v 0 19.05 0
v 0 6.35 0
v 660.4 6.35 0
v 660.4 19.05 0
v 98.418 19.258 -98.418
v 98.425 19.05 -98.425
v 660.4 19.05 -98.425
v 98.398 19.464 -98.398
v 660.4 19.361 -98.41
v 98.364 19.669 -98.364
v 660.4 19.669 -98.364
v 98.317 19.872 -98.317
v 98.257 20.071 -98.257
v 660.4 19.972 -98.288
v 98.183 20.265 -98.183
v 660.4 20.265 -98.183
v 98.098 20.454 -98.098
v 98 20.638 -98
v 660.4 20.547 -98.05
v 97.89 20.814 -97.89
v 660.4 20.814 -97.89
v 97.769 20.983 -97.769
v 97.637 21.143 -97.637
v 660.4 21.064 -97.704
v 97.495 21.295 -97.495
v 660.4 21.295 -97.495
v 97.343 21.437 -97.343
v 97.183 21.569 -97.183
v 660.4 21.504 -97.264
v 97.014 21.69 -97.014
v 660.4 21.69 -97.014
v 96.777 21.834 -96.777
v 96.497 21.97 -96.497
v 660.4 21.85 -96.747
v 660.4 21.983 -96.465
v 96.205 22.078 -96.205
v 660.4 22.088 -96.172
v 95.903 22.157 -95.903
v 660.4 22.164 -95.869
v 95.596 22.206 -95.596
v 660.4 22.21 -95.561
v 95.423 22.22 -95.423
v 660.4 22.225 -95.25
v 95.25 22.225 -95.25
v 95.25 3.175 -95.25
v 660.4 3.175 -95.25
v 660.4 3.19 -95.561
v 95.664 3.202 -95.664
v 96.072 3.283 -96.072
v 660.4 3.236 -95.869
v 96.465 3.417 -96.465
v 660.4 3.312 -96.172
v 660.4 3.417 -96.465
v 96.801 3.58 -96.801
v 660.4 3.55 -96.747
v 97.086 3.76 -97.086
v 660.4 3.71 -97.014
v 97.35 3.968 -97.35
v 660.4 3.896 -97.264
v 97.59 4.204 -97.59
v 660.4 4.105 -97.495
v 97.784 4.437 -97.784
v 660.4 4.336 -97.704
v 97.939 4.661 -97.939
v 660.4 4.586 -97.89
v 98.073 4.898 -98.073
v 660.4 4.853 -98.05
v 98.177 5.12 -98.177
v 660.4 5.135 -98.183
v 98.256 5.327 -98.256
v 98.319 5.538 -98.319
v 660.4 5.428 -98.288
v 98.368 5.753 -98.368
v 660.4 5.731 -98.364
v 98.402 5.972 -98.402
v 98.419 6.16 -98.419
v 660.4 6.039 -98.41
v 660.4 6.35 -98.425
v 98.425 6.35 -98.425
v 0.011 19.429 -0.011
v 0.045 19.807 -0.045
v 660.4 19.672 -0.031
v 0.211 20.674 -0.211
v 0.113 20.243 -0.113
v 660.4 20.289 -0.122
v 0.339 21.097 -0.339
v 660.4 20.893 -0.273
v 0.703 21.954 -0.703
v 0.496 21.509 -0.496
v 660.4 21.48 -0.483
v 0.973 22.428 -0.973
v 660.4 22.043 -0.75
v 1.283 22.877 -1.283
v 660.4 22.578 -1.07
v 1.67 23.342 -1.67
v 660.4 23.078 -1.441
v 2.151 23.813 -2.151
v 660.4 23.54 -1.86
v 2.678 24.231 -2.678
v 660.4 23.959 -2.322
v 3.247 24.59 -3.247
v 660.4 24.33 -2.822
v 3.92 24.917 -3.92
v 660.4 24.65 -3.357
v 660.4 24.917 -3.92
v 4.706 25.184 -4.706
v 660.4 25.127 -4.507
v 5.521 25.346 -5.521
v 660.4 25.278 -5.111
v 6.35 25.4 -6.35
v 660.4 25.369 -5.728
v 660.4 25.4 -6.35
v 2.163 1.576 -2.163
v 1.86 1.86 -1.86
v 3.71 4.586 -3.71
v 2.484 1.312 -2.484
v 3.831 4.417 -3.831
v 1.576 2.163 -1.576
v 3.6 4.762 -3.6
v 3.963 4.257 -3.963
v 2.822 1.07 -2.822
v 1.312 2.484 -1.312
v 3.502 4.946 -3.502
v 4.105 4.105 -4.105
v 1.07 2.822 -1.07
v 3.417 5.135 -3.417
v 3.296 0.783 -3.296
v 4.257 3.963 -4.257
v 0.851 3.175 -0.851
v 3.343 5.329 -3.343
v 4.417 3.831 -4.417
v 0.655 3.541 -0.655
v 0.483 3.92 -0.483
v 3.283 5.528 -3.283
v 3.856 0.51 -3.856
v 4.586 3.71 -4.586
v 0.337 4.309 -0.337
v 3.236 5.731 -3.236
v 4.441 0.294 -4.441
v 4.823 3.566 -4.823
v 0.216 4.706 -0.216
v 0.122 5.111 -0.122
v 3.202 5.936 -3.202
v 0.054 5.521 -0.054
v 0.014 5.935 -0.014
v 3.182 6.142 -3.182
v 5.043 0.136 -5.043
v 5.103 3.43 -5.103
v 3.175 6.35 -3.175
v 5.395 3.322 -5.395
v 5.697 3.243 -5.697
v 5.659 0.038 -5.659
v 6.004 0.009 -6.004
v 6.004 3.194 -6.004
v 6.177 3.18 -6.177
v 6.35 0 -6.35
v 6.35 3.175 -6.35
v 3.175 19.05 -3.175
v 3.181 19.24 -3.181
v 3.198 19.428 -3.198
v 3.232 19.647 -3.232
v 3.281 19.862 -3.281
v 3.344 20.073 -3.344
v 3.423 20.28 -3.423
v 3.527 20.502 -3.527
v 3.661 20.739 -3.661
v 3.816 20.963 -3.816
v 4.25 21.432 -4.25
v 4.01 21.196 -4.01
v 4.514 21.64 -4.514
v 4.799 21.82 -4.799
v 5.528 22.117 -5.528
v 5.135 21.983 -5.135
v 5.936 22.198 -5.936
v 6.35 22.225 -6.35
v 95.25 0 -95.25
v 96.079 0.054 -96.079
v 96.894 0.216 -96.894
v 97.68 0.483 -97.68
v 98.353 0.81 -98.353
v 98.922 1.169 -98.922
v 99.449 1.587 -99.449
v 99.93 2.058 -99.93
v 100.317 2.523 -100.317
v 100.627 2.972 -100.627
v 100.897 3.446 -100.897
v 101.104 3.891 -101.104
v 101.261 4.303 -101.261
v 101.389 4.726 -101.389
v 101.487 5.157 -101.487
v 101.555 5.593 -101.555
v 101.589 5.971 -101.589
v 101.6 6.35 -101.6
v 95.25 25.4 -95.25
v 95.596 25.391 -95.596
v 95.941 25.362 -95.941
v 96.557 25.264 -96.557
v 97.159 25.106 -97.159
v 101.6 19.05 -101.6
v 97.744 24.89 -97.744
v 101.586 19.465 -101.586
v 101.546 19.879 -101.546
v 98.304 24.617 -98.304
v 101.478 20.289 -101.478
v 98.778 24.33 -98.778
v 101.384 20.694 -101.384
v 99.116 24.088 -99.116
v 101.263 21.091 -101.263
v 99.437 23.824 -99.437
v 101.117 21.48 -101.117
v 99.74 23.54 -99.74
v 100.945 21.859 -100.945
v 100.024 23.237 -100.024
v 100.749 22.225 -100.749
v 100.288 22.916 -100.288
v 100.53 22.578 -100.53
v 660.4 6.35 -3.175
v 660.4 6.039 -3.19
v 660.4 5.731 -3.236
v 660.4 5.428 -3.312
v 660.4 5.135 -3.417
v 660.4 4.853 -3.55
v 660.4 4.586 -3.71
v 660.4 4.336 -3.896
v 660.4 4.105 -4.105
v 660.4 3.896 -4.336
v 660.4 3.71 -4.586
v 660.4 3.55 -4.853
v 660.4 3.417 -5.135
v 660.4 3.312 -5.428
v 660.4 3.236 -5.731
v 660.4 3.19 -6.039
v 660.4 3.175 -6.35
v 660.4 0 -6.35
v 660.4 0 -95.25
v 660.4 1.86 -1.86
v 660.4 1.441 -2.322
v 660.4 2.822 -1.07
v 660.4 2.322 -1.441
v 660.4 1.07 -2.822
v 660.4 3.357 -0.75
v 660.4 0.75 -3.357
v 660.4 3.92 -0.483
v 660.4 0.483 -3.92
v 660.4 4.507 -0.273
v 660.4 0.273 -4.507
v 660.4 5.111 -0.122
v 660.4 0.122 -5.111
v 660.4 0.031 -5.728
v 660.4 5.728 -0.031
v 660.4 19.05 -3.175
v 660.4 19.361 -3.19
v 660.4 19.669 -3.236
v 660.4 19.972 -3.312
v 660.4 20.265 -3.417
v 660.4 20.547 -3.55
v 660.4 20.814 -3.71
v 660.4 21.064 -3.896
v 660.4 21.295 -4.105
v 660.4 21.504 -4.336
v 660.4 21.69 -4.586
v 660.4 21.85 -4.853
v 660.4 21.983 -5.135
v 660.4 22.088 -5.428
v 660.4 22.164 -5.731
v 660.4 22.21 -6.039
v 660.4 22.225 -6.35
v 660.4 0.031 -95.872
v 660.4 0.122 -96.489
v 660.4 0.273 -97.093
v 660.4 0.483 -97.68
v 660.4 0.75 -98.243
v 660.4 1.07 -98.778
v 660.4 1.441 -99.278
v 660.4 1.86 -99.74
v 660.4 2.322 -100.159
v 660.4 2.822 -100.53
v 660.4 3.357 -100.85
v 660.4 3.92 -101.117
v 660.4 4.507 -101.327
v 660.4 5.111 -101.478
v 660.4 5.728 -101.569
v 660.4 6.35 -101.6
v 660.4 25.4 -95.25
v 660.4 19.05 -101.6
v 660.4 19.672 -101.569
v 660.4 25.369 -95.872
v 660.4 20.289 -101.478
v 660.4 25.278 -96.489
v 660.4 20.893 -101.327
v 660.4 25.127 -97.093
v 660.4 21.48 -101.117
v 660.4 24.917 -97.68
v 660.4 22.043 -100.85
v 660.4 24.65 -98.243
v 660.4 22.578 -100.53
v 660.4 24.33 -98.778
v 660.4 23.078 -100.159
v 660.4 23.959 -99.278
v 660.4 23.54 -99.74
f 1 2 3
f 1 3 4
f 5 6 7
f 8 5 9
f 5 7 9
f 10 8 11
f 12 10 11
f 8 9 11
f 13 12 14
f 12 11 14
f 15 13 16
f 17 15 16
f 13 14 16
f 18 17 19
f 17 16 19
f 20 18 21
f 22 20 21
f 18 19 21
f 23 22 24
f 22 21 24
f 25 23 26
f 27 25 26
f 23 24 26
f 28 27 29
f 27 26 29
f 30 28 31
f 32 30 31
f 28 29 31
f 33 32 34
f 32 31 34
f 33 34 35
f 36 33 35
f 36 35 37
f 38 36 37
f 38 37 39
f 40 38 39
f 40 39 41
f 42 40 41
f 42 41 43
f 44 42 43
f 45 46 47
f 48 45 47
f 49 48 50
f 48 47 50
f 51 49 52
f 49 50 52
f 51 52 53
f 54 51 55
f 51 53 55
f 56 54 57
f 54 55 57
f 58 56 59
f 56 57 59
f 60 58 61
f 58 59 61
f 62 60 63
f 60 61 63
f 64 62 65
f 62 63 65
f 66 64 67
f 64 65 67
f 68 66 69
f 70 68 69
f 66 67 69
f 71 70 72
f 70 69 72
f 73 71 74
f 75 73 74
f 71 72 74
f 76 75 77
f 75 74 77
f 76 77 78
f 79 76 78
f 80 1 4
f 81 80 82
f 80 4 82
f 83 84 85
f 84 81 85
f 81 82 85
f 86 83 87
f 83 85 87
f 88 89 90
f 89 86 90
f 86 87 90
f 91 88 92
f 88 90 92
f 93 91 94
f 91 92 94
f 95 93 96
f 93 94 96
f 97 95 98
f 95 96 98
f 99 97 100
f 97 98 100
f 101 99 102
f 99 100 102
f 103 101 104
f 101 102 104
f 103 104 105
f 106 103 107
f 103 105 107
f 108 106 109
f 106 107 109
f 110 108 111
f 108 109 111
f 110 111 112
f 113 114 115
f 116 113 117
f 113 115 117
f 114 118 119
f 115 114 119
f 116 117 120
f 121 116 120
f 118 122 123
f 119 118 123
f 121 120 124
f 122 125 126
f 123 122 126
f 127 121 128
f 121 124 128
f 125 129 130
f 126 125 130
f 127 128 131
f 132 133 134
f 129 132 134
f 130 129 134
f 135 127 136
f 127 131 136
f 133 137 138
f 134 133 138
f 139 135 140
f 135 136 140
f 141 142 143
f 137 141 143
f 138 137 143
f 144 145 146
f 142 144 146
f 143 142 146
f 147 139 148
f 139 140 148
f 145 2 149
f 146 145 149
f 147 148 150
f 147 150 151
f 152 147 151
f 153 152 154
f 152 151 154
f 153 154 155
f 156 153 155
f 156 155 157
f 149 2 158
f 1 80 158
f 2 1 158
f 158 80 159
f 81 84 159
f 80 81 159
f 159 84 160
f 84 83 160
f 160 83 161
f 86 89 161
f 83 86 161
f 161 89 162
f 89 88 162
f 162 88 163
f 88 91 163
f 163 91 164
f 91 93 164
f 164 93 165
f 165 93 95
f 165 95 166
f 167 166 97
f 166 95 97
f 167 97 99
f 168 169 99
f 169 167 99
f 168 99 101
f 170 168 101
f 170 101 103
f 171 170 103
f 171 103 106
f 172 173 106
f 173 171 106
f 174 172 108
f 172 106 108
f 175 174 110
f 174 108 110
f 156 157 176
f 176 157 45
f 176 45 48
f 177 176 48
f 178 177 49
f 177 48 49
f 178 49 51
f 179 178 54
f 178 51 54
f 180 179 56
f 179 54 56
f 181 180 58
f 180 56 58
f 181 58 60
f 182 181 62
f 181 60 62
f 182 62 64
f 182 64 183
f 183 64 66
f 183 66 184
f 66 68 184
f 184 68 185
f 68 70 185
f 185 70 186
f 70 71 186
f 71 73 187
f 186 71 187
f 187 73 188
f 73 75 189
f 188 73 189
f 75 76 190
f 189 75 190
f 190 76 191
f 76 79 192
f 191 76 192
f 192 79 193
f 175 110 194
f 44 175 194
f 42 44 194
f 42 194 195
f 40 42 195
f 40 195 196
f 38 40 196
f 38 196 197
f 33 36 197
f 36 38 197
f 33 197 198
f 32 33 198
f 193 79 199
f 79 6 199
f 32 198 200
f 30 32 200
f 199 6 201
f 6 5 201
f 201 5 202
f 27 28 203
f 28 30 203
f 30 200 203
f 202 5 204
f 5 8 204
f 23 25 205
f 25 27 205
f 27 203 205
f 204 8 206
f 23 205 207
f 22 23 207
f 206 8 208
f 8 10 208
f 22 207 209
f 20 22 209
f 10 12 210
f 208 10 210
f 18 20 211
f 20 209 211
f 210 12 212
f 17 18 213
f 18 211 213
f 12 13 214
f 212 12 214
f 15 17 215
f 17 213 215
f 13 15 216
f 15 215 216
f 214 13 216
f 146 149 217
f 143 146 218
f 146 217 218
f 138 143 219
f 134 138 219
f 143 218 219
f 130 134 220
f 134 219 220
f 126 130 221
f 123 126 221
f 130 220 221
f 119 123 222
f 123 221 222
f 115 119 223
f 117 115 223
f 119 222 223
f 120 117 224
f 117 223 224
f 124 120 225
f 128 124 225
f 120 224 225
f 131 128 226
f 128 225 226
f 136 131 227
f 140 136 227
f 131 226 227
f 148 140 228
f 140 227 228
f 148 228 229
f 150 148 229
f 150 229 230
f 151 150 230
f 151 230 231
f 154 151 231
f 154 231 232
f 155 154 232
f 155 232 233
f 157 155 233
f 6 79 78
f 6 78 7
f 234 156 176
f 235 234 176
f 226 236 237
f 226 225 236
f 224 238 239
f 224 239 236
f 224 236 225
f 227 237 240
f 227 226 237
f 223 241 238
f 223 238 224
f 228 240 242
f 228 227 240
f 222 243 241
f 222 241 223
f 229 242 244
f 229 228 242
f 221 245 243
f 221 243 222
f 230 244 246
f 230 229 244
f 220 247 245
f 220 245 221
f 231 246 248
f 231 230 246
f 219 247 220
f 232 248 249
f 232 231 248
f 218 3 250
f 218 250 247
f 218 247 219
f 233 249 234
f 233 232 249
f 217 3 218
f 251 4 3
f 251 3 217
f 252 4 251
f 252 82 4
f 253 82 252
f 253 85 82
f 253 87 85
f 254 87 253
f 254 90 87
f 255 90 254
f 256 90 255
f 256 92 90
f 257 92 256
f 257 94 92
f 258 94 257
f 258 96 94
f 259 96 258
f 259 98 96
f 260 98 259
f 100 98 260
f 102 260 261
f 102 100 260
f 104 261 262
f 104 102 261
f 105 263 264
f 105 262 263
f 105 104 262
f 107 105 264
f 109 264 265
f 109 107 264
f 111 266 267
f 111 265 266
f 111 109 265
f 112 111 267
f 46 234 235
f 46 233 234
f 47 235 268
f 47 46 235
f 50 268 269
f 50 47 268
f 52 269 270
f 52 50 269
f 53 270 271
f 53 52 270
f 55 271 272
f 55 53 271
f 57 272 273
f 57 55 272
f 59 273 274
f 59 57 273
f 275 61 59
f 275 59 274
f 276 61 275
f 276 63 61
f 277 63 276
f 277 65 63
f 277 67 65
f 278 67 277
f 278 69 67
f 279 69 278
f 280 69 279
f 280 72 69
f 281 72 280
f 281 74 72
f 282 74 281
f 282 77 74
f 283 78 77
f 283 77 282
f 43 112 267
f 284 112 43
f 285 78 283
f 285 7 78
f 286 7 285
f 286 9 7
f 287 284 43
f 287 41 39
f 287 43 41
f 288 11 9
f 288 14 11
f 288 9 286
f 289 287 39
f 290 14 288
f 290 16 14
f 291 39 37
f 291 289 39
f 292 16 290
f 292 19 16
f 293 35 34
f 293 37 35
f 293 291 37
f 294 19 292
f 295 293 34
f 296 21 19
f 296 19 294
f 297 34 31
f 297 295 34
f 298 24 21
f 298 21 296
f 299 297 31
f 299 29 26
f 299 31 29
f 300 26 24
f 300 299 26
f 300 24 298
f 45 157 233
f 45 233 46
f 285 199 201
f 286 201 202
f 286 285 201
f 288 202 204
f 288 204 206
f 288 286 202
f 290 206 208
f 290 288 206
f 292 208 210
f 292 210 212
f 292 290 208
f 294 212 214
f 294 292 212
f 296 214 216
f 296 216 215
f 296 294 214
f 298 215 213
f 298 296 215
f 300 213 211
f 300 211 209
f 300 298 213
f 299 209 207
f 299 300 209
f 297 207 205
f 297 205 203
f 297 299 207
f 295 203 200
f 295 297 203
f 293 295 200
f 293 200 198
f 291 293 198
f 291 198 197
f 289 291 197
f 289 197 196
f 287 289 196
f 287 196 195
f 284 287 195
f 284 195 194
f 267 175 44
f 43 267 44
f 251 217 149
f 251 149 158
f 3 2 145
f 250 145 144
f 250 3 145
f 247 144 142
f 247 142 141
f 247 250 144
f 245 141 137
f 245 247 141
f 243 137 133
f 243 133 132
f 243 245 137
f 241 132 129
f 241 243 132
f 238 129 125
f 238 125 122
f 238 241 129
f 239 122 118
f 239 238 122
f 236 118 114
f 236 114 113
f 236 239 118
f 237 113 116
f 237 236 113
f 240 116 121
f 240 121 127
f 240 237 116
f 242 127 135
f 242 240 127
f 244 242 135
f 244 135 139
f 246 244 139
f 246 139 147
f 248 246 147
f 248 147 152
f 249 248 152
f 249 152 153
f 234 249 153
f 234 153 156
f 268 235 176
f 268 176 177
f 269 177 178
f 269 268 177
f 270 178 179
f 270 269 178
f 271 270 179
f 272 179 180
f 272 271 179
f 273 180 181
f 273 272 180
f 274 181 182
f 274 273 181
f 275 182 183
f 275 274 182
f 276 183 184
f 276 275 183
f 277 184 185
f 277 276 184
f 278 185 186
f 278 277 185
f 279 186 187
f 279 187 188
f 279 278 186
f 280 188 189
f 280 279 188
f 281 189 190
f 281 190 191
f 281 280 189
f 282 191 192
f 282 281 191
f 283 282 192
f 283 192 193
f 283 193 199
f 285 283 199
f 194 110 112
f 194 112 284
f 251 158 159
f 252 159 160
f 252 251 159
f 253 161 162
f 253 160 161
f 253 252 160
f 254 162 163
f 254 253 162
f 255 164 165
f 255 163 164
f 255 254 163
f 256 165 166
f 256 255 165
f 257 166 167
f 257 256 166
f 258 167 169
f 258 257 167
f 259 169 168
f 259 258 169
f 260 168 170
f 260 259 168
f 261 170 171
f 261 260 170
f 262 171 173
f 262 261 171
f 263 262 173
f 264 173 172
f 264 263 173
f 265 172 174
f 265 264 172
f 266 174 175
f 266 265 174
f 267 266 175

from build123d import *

# Parameters (mm, degrees)
SKETCH1_W           = 101.6
SKETCH1_H           = 25.4
BOSS_EXTRUDE1_DEPTH = 660.4
FILLET1_R           = 6.35
SHELL1_T            = -3.175
CUT_EXTRUDE1_DEPTH  = 25.4


with BuildPart() as part:
    # Sketch1 → Boss-Extrude1 (new body)
    with BuildSketch(Plane(origin=(0, 0, 0), x_dir=(0, 0, -1), z_dir=(1, 0, 0))):
        with Locations((50.8, 12.7)):
            Rectangle(SKETCH1_W, SKETCH1_H)
    extrude(amount=BOSS_EXTRUDE1_DEPTH)

    # Fillet1
    fillet1_edges = [part.edges().sort_by_distance(p)[0] for p in [
        (330.2, 0, 0),
        (330.2, 0, -101.6),
        (330.2, 25.4, -101.6),
        (330.2, 25.4, 0),
    ]]
    fillet(fillet1_edges, radius=FILLET1_R)

    # Shell1
    shell1_openings = [part.faces().sort_by_distance(p)[0] for p in [
        (0, 12.7, -50.8),
        (660.4, 12.7, -50.8),
    ]]
    offset(amount=SHELL1_T, openings=shell1_openings, kind=Kind.INTERSECTION)

    # Sketch2 → Cut-Extrude1 (cut)
    with BuildSketch(Plane(origin=(0, 25.4, 0), x_dir=(1, 0, 0), z_dir=(0, 1, 0))):
        Polygon((0, 0), (101.6, 101.6), (0, 101.6), align=None)
    extrude(amount=-CUT_EXTRUDE1_DEPTH, mode=Mode.SUBTRACT)


solid = part.part
